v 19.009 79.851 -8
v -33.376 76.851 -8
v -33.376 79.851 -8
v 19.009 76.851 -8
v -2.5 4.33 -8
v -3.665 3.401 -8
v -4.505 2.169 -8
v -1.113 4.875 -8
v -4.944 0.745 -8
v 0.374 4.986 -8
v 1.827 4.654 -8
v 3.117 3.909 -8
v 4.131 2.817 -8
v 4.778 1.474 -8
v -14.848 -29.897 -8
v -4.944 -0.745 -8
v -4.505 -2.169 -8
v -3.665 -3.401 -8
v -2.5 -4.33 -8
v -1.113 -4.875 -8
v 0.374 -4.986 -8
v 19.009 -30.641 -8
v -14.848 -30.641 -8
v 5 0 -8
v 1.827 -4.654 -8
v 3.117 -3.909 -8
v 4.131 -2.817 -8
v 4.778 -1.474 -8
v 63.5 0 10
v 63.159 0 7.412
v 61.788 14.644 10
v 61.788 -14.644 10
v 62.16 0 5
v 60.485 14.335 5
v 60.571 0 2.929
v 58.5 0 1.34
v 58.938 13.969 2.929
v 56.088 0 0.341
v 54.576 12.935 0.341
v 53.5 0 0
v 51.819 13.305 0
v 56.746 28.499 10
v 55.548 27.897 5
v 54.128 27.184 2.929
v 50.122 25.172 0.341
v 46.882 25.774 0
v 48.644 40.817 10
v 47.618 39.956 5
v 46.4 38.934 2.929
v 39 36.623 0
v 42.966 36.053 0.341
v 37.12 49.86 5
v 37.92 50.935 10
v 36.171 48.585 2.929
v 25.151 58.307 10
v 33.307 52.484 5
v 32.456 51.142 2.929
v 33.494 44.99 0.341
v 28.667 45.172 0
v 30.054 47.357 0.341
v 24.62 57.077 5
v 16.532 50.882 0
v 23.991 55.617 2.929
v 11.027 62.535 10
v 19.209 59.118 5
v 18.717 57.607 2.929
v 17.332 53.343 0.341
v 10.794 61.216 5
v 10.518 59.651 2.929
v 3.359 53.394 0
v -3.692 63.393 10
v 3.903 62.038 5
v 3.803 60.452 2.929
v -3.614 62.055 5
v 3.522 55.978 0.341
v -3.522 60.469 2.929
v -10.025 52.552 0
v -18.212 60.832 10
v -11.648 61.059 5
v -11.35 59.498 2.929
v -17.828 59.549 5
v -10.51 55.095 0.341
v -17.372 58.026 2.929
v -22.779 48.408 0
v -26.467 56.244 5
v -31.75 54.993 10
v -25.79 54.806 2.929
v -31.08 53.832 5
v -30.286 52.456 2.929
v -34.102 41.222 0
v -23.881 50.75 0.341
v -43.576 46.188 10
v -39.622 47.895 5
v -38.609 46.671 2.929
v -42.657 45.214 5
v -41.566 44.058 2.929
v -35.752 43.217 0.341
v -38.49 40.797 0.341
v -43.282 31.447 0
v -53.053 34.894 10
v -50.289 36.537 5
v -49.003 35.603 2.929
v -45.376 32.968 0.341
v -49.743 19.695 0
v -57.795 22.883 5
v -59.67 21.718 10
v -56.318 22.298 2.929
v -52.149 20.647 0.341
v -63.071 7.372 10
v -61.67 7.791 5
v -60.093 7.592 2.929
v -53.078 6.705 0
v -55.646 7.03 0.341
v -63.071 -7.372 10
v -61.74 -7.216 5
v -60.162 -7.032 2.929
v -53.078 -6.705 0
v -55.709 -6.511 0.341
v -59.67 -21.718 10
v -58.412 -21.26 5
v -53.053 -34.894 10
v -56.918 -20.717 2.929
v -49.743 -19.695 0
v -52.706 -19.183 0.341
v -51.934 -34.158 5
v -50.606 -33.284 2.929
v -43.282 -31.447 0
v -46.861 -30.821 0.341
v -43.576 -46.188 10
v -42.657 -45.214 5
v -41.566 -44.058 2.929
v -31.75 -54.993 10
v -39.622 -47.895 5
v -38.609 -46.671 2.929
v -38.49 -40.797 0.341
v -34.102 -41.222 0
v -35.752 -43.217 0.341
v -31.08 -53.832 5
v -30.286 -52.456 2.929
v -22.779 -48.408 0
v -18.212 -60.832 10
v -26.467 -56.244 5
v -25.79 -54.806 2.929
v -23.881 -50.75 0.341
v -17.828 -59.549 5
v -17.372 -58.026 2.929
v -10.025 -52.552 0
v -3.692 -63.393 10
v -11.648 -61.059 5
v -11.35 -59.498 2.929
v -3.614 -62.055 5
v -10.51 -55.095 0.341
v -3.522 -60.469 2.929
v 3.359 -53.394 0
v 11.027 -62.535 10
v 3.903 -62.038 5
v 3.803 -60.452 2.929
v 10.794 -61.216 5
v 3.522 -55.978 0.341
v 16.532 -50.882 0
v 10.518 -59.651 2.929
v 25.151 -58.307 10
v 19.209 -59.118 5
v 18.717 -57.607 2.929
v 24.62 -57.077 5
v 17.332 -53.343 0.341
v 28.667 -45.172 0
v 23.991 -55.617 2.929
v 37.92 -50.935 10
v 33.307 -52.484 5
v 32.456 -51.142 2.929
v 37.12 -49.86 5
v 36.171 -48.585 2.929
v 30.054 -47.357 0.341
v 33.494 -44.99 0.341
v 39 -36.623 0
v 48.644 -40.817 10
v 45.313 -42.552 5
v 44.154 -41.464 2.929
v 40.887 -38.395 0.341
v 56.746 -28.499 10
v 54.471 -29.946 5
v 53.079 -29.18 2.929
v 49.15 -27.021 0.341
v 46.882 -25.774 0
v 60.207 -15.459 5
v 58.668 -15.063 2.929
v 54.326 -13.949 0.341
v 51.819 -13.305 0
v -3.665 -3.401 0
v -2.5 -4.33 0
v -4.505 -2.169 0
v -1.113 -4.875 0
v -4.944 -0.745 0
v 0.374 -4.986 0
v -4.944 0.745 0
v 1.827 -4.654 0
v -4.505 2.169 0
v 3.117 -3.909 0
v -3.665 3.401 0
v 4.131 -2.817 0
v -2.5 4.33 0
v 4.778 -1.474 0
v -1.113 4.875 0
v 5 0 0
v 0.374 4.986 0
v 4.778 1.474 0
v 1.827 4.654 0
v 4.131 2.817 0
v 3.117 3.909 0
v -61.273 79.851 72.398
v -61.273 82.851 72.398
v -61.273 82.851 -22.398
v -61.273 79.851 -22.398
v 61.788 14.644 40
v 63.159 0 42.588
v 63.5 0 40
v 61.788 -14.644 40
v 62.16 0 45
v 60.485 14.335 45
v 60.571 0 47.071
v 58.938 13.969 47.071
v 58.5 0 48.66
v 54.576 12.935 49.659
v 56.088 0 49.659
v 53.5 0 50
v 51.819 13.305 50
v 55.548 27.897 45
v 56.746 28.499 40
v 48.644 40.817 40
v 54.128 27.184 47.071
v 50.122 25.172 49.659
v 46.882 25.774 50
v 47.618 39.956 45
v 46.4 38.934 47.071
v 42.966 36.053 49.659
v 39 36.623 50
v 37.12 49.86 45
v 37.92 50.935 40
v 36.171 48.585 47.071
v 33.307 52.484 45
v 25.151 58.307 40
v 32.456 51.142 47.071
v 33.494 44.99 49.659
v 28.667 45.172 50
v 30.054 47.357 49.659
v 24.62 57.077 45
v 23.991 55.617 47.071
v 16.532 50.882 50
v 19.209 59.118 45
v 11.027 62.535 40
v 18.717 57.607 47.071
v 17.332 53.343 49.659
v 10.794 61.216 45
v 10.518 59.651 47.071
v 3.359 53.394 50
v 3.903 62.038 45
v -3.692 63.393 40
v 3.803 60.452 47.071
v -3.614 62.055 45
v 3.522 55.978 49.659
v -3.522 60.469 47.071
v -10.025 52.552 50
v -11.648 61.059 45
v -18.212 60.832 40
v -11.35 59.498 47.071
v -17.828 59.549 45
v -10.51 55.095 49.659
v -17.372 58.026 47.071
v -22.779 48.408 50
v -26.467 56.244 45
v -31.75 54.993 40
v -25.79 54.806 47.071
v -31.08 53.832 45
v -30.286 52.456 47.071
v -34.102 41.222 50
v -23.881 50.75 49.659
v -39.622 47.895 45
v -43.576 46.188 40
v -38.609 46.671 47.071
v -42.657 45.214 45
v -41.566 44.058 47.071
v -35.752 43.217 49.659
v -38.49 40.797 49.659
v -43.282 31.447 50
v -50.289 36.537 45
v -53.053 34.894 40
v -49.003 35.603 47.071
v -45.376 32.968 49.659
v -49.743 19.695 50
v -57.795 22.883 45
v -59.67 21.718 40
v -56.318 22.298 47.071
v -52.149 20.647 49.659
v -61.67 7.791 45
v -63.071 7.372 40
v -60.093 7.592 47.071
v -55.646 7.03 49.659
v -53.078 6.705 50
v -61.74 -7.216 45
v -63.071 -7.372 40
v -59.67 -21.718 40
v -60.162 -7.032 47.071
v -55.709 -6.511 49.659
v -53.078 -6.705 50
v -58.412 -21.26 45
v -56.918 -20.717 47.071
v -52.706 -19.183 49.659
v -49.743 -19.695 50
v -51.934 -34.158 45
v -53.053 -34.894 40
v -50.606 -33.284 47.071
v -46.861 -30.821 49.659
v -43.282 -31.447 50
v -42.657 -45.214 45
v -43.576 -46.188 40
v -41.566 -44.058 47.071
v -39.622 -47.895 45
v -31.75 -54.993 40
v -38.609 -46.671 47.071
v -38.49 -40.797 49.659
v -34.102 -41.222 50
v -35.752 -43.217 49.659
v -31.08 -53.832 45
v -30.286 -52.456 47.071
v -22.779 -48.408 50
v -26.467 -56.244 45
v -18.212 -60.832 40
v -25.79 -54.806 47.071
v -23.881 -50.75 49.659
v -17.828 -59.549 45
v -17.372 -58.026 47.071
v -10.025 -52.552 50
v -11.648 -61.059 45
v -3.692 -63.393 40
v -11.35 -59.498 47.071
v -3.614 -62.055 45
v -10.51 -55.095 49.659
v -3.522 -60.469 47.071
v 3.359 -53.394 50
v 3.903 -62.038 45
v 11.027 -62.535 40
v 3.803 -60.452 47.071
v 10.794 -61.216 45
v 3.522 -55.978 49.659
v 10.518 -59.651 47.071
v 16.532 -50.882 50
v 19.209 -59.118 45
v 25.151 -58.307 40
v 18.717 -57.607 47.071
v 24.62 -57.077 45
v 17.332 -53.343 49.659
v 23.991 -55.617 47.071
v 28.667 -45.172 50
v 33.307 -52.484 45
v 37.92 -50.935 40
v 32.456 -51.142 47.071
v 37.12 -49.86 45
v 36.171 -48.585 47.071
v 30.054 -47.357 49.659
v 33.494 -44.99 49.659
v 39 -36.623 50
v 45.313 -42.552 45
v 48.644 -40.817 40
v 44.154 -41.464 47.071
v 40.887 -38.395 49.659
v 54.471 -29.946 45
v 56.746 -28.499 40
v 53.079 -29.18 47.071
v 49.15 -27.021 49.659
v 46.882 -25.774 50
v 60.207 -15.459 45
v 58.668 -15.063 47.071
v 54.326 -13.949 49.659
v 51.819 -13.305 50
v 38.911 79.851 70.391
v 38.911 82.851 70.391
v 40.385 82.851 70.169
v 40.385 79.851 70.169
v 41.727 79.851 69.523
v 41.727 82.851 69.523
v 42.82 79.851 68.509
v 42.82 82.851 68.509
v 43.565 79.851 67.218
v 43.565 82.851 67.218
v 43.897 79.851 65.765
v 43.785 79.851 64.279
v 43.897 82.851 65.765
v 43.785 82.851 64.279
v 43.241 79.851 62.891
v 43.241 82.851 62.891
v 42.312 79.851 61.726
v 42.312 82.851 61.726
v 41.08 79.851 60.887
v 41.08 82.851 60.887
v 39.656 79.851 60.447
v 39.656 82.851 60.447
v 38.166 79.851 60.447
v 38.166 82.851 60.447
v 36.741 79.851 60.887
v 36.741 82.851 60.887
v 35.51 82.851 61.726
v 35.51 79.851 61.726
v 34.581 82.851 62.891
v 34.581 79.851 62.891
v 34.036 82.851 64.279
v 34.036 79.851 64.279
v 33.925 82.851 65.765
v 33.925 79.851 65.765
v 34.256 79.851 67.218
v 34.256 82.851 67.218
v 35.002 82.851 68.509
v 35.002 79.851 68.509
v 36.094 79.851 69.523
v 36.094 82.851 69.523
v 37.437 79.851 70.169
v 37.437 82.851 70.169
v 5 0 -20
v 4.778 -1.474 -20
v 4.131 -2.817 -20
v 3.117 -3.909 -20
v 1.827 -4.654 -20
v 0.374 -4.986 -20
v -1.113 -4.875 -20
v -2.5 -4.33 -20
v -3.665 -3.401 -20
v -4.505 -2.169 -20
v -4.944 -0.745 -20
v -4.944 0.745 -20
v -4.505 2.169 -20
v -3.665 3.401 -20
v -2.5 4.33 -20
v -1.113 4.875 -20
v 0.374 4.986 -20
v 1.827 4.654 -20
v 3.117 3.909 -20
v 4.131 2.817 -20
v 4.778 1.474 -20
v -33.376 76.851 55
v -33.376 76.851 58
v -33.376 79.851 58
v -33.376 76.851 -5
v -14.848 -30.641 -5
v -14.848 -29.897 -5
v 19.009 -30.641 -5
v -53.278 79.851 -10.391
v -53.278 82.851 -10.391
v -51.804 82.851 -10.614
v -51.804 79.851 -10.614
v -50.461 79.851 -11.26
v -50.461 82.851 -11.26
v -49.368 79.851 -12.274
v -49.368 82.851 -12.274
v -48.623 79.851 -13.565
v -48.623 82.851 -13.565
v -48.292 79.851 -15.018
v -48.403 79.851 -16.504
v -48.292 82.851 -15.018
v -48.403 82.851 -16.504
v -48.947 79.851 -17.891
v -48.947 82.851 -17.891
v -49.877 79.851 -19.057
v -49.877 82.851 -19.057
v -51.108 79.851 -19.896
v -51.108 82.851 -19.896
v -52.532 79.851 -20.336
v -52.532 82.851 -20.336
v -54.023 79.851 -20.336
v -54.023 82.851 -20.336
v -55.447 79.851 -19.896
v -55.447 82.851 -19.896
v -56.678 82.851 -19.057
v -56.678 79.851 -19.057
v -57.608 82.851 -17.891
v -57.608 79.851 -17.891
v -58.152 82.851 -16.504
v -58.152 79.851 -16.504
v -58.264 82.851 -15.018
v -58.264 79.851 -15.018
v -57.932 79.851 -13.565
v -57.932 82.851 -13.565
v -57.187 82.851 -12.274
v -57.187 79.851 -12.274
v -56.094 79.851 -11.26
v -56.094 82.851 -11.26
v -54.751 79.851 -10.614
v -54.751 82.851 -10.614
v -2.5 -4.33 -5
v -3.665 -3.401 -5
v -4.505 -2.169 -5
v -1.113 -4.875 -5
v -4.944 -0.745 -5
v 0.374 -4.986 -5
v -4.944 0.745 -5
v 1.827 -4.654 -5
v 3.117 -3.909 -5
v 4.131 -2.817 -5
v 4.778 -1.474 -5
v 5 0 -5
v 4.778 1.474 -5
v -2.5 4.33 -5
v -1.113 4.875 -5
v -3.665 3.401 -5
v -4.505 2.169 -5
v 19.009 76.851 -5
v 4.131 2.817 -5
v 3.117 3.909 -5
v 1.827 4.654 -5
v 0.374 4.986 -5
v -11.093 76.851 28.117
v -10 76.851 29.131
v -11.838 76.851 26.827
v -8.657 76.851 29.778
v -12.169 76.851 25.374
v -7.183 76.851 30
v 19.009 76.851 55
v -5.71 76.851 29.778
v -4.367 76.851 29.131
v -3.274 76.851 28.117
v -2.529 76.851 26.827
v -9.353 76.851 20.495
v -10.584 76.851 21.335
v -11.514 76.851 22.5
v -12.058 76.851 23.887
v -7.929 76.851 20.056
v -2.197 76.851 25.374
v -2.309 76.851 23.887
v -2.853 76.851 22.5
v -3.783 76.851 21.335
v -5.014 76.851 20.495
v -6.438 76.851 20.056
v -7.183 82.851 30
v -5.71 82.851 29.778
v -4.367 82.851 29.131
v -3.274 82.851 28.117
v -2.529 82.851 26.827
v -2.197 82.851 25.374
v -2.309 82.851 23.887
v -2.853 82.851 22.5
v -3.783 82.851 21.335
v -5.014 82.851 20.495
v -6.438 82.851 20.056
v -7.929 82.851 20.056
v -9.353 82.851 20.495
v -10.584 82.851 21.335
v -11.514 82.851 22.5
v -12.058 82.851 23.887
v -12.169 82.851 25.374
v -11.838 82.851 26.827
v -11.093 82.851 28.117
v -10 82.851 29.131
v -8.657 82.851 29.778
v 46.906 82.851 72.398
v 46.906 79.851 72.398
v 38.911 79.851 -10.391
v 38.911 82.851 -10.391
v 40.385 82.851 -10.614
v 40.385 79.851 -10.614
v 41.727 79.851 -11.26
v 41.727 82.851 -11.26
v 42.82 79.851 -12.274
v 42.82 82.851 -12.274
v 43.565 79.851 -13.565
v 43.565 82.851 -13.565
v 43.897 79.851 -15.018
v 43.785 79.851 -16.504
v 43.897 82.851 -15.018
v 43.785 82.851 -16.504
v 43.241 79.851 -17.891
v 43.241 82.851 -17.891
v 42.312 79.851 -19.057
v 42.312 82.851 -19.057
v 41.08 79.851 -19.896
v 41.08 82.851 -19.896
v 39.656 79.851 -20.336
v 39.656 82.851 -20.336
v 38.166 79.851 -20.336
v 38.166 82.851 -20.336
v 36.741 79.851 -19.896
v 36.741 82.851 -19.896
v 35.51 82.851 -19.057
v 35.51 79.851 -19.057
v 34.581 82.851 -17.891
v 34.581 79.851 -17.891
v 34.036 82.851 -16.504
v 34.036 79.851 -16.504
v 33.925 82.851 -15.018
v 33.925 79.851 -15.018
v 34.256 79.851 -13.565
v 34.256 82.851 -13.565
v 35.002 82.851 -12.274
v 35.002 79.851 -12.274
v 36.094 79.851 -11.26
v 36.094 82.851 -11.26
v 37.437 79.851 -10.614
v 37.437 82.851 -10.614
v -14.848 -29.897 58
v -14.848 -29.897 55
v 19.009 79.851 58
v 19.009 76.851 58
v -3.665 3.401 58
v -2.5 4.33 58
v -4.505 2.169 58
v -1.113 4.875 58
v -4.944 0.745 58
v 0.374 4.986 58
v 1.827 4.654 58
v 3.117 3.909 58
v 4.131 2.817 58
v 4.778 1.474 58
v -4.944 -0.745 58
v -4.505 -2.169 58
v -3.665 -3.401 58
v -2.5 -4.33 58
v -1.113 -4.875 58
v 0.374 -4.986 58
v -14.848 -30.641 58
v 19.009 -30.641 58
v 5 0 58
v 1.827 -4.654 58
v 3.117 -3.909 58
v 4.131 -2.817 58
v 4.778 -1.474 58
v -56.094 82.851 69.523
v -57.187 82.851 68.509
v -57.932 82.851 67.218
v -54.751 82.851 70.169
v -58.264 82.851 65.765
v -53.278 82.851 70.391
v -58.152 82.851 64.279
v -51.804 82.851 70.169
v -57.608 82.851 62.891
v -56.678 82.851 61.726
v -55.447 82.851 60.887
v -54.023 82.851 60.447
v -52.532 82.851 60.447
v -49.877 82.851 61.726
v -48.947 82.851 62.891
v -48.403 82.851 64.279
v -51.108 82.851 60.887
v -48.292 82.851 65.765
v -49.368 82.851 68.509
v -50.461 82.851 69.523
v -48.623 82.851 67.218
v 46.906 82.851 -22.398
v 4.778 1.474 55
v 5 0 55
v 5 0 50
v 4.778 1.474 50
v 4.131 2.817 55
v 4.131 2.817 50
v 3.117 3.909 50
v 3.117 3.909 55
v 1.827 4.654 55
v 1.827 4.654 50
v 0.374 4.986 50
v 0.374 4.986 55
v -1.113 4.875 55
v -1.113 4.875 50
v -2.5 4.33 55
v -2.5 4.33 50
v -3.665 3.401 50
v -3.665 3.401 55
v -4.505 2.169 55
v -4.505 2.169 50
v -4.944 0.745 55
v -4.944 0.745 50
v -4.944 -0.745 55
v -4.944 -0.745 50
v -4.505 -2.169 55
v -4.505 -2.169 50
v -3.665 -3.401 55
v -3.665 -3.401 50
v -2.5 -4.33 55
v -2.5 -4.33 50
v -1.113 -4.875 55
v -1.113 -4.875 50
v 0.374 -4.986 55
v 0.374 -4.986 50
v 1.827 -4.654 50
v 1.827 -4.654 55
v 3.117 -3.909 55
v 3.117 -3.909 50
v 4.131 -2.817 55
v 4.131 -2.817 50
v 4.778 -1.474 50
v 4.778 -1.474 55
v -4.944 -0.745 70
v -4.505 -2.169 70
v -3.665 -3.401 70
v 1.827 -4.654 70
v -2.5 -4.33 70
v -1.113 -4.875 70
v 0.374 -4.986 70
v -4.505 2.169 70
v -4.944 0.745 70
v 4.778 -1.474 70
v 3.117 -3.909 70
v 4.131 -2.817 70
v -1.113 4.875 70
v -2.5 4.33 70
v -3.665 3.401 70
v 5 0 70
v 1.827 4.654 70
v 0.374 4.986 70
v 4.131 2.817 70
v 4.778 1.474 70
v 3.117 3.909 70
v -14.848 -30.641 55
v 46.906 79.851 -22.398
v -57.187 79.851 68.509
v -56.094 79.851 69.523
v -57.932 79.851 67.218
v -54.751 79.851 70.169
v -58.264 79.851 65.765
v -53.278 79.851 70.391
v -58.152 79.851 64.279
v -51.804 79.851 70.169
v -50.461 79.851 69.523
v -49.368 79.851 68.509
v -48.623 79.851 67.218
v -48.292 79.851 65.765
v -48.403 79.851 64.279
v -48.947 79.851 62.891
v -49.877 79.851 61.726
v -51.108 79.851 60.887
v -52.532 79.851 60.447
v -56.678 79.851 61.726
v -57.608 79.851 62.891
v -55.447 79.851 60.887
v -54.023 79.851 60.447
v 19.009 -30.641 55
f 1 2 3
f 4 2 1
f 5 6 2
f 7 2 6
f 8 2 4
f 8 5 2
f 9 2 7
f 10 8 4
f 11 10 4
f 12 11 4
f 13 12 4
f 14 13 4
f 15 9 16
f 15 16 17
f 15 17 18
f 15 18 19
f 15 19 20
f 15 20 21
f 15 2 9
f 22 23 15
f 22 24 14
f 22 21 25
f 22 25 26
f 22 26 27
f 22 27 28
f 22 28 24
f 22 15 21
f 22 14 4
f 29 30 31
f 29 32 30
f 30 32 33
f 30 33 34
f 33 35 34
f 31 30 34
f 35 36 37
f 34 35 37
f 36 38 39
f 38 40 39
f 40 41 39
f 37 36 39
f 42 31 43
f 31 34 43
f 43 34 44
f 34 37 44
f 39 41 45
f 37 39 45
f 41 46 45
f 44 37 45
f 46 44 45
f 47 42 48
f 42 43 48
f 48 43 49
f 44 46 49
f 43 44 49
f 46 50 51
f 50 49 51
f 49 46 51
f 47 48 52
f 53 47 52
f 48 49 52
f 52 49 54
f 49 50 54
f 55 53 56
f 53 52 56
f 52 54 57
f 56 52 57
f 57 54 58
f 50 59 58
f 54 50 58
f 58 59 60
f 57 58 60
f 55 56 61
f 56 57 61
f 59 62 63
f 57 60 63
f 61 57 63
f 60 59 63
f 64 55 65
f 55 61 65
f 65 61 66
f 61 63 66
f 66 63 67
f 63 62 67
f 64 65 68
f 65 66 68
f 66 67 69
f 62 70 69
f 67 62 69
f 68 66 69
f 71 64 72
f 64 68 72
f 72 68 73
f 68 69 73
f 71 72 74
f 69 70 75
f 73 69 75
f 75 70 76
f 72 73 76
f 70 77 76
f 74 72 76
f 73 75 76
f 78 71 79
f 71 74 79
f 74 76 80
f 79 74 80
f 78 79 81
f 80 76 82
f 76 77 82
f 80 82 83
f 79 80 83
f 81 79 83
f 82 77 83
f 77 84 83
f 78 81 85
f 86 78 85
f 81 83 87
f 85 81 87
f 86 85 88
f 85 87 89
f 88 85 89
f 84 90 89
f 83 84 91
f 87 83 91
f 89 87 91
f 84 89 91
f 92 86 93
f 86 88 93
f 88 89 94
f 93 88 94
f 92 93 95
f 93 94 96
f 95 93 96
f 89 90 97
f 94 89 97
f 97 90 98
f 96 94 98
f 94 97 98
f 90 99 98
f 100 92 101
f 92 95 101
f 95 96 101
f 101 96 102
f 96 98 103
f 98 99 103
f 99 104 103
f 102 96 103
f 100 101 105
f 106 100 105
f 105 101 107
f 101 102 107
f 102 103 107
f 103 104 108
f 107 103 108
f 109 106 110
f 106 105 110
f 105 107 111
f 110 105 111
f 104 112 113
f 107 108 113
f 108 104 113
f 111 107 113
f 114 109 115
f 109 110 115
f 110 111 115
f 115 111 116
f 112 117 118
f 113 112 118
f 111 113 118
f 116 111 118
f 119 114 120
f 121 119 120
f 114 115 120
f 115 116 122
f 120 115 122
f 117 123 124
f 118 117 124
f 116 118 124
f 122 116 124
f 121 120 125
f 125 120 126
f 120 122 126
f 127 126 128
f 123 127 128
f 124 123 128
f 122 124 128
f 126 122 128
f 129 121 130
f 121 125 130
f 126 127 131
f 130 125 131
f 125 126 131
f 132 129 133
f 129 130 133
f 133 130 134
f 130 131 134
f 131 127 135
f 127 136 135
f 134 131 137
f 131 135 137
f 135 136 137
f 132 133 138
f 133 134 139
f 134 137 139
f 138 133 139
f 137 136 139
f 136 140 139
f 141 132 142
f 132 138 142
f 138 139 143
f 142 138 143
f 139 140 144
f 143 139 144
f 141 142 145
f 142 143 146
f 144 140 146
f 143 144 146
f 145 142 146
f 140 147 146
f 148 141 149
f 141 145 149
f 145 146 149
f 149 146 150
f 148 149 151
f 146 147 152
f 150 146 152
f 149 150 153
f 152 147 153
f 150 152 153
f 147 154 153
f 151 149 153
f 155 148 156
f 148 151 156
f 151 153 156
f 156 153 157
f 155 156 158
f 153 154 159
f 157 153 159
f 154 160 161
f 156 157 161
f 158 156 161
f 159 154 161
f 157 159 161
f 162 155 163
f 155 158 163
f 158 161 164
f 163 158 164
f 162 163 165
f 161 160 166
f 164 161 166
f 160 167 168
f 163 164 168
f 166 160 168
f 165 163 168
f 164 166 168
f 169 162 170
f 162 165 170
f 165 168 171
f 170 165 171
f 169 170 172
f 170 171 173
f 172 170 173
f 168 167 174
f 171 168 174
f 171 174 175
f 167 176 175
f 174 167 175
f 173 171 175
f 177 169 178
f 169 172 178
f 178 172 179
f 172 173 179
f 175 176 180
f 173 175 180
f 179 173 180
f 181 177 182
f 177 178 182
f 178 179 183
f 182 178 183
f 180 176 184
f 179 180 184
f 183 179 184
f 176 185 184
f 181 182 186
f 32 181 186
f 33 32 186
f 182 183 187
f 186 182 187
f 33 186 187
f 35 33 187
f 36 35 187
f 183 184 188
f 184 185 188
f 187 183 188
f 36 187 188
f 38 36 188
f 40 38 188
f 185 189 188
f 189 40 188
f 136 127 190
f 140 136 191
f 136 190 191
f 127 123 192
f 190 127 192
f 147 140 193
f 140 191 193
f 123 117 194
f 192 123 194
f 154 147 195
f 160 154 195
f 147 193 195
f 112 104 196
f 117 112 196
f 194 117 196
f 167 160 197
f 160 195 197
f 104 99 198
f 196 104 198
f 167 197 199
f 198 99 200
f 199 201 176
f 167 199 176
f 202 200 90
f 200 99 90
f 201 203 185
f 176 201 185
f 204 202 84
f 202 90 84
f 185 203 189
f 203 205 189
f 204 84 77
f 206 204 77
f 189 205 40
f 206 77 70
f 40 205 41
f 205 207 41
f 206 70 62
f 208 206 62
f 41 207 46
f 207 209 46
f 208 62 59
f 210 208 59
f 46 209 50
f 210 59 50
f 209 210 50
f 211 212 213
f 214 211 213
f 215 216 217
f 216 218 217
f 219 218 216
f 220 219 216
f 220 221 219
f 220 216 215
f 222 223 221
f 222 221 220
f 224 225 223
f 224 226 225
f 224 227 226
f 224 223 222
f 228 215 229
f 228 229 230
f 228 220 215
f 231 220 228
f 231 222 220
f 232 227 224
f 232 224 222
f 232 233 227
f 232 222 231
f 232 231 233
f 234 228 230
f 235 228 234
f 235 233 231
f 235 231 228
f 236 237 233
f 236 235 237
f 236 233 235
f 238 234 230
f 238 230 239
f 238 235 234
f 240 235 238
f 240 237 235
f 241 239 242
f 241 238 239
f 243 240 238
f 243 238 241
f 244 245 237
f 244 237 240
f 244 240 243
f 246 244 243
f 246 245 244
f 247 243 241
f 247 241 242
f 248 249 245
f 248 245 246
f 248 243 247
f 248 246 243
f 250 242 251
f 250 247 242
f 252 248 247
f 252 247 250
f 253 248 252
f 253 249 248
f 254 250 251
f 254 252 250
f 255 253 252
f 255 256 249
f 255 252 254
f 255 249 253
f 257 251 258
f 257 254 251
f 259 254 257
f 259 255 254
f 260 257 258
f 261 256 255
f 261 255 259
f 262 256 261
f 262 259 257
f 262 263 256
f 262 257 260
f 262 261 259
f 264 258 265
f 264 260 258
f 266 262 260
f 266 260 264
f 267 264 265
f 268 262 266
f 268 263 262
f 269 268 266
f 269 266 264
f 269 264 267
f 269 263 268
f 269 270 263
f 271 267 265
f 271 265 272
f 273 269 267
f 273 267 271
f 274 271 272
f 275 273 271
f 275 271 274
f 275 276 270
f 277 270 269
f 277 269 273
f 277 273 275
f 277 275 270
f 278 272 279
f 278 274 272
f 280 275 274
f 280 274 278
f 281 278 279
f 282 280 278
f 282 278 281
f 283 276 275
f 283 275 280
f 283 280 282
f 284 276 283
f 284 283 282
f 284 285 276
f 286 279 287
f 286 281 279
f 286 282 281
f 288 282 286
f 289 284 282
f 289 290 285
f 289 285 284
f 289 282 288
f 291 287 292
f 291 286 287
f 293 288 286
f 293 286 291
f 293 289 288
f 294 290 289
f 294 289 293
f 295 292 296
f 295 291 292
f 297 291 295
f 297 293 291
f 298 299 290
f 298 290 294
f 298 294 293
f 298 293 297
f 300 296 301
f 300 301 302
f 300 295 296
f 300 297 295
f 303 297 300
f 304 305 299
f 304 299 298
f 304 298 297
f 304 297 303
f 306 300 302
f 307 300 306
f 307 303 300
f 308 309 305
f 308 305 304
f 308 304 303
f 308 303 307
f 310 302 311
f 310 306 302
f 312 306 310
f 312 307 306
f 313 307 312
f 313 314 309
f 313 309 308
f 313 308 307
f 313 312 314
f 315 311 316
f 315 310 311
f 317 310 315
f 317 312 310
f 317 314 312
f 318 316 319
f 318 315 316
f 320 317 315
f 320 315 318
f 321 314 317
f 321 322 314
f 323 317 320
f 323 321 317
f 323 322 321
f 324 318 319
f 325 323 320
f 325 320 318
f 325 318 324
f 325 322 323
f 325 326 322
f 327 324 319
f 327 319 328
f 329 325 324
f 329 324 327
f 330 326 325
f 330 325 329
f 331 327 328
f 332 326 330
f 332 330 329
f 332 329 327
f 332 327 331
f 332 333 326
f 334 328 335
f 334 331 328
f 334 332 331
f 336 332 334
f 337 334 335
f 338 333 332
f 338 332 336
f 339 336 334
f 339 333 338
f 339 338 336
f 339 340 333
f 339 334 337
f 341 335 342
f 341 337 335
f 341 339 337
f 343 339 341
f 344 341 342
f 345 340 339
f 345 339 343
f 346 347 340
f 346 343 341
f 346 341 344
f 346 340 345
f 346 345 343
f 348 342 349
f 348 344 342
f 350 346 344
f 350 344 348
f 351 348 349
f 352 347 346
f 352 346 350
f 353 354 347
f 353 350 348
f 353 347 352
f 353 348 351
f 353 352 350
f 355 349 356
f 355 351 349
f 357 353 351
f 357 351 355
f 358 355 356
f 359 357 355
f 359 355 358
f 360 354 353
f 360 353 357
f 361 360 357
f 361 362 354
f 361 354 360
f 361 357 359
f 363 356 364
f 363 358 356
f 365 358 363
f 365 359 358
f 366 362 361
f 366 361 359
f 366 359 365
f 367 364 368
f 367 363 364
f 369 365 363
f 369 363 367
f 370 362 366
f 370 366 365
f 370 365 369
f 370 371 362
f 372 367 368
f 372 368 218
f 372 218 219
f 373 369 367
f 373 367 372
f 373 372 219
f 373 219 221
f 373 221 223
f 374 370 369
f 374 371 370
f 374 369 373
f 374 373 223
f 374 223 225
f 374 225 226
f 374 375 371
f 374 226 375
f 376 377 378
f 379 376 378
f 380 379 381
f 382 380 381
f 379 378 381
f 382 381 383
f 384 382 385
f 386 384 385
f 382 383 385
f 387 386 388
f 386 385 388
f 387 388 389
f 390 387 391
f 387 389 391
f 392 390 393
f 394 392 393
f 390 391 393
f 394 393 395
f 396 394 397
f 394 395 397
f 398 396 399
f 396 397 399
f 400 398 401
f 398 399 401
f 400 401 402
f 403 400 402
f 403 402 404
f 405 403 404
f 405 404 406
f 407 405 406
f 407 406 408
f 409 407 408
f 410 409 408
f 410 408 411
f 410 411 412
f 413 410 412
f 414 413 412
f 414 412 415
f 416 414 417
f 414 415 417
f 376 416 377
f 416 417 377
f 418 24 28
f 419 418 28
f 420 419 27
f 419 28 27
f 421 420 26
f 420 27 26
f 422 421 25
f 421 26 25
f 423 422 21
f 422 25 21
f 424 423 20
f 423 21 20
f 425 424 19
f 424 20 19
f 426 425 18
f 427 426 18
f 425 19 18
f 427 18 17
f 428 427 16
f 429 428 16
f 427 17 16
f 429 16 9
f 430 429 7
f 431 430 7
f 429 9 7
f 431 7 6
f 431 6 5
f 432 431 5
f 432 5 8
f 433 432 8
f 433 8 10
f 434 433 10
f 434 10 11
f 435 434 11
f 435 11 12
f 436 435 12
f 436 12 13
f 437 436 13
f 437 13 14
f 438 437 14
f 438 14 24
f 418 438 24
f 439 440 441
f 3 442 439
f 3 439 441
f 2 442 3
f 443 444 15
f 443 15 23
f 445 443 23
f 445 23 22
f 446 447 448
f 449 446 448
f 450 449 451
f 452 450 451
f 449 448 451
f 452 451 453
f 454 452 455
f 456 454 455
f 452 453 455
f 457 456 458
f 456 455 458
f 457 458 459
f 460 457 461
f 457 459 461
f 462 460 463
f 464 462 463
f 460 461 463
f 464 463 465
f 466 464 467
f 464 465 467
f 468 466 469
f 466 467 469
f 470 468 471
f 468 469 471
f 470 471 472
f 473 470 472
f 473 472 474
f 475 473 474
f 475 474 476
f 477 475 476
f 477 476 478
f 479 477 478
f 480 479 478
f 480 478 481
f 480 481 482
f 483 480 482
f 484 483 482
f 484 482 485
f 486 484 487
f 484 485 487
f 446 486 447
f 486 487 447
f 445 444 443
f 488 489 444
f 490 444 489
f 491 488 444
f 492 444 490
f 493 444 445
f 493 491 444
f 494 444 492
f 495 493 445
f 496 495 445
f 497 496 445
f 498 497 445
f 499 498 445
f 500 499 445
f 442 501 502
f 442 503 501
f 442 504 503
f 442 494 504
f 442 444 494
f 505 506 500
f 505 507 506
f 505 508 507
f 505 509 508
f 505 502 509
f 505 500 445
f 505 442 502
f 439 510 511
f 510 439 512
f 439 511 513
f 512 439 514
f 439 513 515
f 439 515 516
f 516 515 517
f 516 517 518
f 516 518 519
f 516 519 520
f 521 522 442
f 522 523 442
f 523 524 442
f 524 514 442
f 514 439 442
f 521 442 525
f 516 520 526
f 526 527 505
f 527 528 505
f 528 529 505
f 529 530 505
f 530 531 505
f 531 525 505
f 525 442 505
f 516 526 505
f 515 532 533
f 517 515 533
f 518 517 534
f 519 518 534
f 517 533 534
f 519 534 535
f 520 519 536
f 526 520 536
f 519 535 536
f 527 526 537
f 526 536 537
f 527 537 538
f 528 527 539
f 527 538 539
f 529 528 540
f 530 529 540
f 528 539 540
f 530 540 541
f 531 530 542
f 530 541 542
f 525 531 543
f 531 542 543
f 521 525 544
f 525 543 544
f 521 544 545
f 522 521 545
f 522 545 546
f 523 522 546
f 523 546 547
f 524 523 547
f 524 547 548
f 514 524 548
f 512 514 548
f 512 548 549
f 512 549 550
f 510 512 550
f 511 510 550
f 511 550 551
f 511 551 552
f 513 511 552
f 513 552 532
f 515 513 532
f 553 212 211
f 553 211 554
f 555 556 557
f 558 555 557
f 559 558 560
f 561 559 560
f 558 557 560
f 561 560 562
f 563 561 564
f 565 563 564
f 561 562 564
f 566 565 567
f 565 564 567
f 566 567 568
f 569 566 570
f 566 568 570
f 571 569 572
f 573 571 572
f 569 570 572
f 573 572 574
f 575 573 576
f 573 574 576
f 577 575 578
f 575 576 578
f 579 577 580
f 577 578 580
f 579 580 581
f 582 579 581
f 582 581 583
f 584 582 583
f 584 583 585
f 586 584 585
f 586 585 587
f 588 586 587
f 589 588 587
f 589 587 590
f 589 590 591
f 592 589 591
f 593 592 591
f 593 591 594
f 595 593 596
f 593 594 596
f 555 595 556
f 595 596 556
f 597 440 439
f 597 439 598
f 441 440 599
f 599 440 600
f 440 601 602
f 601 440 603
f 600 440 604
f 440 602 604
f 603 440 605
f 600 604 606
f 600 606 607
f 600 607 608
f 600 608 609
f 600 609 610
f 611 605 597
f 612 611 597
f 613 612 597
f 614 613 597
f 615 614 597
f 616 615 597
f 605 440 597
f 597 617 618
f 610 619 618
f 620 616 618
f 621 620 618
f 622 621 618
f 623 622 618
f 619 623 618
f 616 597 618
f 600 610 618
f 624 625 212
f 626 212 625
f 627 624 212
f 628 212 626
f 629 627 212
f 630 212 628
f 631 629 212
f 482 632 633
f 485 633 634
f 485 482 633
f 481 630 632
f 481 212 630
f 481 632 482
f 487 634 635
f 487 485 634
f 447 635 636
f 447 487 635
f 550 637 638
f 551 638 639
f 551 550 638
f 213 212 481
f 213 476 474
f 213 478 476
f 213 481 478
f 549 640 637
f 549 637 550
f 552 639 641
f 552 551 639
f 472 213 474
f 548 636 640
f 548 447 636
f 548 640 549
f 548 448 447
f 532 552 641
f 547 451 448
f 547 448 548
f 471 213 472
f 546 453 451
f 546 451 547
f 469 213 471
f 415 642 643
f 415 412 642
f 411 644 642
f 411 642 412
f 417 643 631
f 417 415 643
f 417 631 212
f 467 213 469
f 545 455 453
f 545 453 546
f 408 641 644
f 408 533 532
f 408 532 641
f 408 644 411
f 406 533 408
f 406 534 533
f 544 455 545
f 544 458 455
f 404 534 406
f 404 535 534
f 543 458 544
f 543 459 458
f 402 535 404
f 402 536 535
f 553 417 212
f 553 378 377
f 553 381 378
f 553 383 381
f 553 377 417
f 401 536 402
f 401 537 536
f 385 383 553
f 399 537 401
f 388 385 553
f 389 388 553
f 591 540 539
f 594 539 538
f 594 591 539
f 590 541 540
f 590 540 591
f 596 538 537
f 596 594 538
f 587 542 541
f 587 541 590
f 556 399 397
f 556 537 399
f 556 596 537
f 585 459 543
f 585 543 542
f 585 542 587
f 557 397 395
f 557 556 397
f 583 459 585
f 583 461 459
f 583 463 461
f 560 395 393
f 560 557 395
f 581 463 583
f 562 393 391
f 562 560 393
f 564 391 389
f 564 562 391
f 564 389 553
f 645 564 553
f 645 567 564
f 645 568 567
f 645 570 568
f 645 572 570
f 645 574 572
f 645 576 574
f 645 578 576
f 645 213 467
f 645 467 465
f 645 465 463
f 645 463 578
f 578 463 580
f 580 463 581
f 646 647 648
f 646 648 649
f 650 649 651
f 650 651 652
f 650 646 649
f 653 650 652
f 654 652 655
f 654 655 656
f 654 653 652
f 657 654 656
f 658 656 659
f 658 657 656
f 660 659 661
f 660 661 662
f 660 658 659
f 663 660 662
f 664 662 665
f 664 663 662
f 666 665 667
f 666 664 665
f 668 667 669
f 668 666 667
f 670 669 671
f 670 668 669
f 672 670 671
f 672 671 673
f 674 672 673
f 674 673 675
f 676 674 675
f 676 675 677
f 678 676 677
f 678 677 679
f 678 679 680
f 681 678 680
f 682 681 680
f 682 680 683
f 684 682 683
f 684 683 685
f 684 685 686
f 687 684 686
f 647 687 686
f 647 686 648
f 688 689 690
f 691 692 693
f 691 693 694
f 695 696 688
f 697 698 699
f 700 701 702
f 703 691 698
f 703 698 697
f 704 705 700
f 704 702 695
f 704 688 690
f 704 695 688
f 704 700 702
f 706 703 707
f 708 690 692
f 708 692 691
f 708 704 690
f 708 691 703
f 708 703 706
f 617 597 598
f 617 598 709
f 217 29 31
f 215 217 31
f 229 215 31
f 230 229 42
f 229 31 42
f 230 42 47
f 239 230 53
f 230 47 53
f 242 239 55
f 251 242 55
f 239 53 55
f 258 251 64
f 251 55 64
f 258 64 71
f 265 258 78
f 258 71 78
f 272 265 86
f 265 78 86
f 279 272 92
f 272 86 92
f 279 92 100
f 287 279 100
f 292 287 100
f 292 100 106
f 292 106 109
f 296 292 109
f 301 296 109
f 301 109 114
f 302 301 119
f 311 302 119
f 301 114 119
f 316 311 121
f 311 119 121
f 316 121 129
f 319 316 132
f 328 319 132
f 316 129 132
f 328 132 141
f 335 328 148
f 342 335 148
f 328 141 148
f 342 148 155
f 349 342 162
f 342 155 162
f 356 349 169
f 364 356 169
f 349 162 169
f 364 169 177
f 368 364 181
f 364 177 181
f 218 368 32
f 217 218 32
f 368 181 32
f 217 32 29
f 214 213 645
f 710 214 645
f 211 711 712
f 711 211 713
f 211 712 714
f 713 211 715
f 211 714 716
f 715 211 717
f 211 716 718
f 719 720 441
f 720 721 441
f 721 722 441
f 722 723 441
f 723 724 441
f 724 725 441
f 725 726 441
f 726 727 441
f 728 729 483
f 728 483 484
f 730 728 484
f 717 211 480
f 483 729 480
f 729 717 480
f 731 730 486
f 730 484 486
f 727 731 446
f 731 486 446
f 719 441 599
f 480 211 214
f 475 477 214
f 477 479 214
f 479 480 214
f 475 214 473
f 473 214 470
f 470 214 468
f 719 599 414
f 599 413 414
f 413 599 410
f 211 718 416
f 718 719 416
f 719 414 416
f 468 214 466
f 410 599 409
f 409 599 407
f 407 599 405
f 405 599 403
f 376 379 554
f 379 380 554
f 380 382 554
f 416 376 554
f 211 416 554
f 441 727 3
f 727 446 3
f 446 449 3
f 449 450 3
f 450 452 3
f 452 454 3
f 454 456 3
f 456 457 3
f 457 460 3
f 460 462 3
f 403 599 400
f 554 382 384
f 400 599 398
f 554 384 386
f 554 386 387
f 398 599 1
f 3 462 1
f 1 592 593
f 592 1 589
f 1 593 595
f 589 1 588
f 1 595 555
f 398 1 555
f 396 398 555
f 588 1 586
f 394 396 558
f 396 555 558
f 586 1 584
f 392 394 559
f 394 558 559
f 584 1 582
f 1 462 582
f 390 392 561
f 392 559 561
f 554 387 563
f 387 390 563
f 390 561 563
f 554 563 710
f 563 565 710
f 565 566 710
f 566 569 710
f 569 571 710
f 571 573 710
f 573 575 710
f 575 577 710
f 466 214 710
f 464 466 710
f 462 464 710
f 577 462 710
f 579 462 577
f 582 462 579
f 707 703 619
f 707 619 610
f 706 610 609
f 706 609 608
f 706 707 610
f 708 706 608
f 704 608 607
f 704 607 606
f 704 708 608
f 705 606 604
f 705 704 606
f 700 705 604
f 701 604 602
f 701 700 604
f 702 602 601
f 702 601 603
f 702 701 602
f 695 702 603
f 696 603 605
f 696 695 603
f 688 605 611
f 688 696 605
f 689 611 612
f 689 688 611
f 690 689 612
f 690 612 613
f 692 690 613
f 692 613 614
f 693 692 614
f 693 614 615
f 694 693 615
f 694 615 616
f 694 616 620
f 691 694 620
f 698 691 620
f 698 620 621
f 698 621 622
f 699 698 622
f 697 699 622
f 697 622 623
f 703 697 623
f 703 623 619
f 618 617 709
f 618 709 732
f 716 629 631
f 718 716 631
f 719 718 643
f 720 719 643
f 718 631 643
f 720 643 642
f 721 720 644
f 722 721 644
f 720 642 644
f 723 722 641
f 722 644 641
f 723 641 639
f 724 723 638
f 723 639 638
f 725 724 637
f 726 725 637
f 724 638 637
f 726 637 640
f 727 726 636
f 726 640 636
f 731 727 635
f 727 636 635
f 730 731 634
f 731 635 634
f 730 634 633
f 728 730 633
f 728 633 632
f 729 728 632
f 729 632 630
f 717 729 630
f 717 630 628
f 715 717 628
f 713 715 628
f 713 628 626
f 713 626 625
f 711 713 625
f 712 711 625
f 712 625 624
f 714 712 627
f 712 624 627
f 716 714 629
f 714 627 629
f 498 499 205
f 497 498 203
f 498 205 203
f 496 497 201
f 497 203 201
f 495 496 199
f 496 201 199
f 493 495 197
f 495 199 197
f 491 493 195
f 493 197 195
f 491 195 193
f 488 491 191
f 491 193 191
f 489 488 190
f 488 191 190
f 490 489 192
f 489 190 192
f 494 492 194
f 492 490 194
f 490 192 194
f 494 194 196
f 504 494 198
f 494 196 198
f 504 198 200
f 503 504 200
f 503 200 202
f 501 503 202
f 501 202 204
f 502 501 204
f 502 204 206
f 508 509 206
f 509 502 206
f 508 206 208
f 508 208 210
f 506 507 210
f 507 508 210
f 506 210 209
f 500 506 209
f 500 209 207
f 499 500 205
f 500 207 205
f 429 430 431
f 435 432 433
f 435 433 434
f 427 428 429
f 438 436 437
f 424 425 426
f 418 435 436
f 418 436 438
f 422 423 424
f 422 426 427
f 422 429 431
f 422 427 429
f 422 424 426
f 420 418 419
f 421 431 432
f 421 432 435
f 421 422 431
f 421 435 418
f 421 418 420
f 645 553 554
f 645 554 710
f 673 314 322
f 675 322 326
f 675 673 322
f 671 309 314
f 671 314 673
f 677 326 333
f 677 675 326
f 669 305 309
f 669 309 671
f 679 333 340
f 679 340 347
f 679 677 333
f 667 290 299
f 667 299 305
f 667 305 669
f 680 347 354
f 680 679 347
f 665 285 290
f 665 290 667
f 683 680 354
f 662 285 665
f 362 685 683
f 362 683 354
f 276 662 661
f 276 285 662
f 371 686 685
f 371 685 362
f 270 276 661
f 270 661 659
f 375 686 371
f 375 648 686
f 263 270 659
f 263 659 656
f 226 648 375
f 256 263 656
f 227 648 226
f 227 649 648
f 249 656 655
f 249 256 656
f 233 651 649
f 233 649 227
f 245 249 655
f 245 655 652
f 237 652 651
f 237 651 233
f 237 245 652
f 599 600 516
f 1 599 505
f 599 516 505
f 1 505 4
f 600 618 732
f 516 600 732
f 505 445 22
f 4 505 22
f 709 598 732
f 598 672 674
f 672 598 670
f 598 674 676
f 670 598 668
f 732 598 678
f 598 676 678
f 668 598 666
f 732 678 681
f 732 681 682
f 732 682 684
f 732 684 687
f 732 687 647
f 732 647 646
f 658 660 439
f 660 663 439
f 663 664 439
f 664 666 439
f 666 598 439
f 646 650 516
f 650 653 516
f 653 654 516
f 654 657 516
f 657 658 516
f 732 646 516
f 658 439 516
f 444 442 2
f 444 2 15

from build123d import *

# Parameters (mm, degrees)
SKETCH_1_R             = 63.5
EXTRUDE_1_DEPTH        = 50
FILLET_1_R             = 10
SKETCH_2_R             = 5
EXTRUDE_2_DEPTH        = 20
EXTRUDE_START          = 20
SKETCH_3_R             = 5
EXTRUDE_3_DEPTH        = 20
EXTRUDE_START_2        = 3
SKETCH_4_R             = 5
EXTRUDE_4_DEPTH        = 3
PATTERN_LINEAR_1_COUNT = 2
PATTERN_LINEAR_1_PITCH = 63
SKETCH_5_W             = 52.384505053
SKETCH_5_H             = 66
EXTRUDE_5_DEPTH        = 3
SKETCH_6_R             = 5
CUT_EXTRUDE_1_DEPTH    = 3
SKETCH_7_W             = 108.179639097
SKETCH_7_H             = 94.795773282
SKETCH_7_R             = 5
EXTRUDE_6_DEPTH        = 3


with BuildPart() as part:
    # 草图1 → 凸台-拉伸1 (new body)
    with BuildSketch(Plane.XY):
        Circle(SKETCH_1_R)
    extrude(amount=EXTRUDE_1_DEPTH)

    # 圆角1
    fillet_1_edges = [part.edges().sort_by_distance(p)[0] for p in [
        (-63.5, 0, 0),
        (-63.5, 0, 50),
    ]]
    fillet(fillet_1_edges, radius=FILLET_1_R)

    # 草图2 → 凸台-拉伸2 (add)
    with BuildSketch(Plane(origin=(0, 0, 0), x_dir=(-1, 0, 0), z_dir=(0, 0, -1))):
        with Locations(Location((0, 0, 0), (0, 0, 180))):
            Circle(SKETCH_2_R)
    extrude(amount=EXTRUDE_2_DEPTH)

    # 草图3 → 凸台-拉伸3 (add)
    with BuildSketch(Plane.XY.offset(50).offset(EXTRUDE_START)):
        Circle(SKETCH_3_R)
    extrude(amount=-EXTRUDE_3_DEPTH)

    # 草图4 → 凸台-拉伸4 (add)
    with BuildSketch(Plane.XY.offset(55).offset(EXTRUDE_START_2)):
        Polygon((-14.847710206, -30.641134437), (19.008851919, -30.641134437), (19.008851919, 76.850518215), (-33.375653134, 76.850518215), (-14.847710206, -29.89657058), align=None)
        Circle(SKETCH_4_R, mode=Mode.SUBTRACT)
    extrude_4 = extrude(amount=-EXTRUDE_4_DEPTH)

    # 阵列(线性)1: 凸台-拉伸4 ×2
    with Locations(*[(0, 0, -i * PATTERN_LINEAR_1_PITCH) for i in range(1, PATTERN_LINEAR_1_COUNT)]):
        add(extrude_4)

    # 草图5 → 凸台-拉伸5 (add)
    with BuildSketch(Plane(origin=(0, 76.850518215, 0), x_dir=(1, 0, 0), z_dir=(0, 1, 0))):
        with Locations((-7.183400608, -25)):
            Rectangle(SKETCH_5_W, SKETCH_5_H)
    extrude(amount=EXTRUDE_5_DEPTH)

    # 草图6 → 切除-拉伸1 (cut)
    with BuildSketch(Plane(origin=(0, 79.850518215, 0), x_dir=(1, 0, 0), z_dir=(0, 1, 0))):
        with Locations(Location((-7.183400607, -25, 0), (0, 0, 270))):
            Circle(SKETCH_6_R)
    extrude(amount=-CUT_EXTRUDE_1_DEPTH, mode=Mode.SUBTRACT)

    # 草图7 → 凸台-拉伸6 (add)
    with BuildSketch(Plane(origin=(0, 79.850518215, 0), x_dir=(1, 0, 0), z_dir=(0, 1, 0)).offset(EXTRUDE_START_2)):
        with Locations((-7.183400607, -25)):
            Rectangle(SKETCH_7_W, SKETCH_7_H)
        with Locations(Location((-53.277526454, 15.391411359, 0), (0, 0, 270))):
            Circle(SKETCH_7_R, mode=Mode.SUBTRACT)
        with Locations(Location((-53.277526454, -65.391411359, 0), (0, 0, 270))):
            Circle(SKETCH_7_R, mode=Mode.SUBTRACT)
        with Locations(Location((38.910725239, -65.391411359, 0), (0, 0, 270))):
            Circle(SKETCH_7_R, mode=Mode.SUBTRACT)
        with Locations(Location((38.910725239, 15.391411359, 0), (0, 0, 270))):
            Circle(SKETCH_7_R, mode=Mode.SUBTRACT)
        with Locations(Location((-7.183400607, -25, 0), (0, 0, 270))):
            Circle(SKETCH_7_R, mode=Mode.SUBTRACT)
    extrude(amount=-EXTRUDE_6_DEPTH)


solid = part.part
